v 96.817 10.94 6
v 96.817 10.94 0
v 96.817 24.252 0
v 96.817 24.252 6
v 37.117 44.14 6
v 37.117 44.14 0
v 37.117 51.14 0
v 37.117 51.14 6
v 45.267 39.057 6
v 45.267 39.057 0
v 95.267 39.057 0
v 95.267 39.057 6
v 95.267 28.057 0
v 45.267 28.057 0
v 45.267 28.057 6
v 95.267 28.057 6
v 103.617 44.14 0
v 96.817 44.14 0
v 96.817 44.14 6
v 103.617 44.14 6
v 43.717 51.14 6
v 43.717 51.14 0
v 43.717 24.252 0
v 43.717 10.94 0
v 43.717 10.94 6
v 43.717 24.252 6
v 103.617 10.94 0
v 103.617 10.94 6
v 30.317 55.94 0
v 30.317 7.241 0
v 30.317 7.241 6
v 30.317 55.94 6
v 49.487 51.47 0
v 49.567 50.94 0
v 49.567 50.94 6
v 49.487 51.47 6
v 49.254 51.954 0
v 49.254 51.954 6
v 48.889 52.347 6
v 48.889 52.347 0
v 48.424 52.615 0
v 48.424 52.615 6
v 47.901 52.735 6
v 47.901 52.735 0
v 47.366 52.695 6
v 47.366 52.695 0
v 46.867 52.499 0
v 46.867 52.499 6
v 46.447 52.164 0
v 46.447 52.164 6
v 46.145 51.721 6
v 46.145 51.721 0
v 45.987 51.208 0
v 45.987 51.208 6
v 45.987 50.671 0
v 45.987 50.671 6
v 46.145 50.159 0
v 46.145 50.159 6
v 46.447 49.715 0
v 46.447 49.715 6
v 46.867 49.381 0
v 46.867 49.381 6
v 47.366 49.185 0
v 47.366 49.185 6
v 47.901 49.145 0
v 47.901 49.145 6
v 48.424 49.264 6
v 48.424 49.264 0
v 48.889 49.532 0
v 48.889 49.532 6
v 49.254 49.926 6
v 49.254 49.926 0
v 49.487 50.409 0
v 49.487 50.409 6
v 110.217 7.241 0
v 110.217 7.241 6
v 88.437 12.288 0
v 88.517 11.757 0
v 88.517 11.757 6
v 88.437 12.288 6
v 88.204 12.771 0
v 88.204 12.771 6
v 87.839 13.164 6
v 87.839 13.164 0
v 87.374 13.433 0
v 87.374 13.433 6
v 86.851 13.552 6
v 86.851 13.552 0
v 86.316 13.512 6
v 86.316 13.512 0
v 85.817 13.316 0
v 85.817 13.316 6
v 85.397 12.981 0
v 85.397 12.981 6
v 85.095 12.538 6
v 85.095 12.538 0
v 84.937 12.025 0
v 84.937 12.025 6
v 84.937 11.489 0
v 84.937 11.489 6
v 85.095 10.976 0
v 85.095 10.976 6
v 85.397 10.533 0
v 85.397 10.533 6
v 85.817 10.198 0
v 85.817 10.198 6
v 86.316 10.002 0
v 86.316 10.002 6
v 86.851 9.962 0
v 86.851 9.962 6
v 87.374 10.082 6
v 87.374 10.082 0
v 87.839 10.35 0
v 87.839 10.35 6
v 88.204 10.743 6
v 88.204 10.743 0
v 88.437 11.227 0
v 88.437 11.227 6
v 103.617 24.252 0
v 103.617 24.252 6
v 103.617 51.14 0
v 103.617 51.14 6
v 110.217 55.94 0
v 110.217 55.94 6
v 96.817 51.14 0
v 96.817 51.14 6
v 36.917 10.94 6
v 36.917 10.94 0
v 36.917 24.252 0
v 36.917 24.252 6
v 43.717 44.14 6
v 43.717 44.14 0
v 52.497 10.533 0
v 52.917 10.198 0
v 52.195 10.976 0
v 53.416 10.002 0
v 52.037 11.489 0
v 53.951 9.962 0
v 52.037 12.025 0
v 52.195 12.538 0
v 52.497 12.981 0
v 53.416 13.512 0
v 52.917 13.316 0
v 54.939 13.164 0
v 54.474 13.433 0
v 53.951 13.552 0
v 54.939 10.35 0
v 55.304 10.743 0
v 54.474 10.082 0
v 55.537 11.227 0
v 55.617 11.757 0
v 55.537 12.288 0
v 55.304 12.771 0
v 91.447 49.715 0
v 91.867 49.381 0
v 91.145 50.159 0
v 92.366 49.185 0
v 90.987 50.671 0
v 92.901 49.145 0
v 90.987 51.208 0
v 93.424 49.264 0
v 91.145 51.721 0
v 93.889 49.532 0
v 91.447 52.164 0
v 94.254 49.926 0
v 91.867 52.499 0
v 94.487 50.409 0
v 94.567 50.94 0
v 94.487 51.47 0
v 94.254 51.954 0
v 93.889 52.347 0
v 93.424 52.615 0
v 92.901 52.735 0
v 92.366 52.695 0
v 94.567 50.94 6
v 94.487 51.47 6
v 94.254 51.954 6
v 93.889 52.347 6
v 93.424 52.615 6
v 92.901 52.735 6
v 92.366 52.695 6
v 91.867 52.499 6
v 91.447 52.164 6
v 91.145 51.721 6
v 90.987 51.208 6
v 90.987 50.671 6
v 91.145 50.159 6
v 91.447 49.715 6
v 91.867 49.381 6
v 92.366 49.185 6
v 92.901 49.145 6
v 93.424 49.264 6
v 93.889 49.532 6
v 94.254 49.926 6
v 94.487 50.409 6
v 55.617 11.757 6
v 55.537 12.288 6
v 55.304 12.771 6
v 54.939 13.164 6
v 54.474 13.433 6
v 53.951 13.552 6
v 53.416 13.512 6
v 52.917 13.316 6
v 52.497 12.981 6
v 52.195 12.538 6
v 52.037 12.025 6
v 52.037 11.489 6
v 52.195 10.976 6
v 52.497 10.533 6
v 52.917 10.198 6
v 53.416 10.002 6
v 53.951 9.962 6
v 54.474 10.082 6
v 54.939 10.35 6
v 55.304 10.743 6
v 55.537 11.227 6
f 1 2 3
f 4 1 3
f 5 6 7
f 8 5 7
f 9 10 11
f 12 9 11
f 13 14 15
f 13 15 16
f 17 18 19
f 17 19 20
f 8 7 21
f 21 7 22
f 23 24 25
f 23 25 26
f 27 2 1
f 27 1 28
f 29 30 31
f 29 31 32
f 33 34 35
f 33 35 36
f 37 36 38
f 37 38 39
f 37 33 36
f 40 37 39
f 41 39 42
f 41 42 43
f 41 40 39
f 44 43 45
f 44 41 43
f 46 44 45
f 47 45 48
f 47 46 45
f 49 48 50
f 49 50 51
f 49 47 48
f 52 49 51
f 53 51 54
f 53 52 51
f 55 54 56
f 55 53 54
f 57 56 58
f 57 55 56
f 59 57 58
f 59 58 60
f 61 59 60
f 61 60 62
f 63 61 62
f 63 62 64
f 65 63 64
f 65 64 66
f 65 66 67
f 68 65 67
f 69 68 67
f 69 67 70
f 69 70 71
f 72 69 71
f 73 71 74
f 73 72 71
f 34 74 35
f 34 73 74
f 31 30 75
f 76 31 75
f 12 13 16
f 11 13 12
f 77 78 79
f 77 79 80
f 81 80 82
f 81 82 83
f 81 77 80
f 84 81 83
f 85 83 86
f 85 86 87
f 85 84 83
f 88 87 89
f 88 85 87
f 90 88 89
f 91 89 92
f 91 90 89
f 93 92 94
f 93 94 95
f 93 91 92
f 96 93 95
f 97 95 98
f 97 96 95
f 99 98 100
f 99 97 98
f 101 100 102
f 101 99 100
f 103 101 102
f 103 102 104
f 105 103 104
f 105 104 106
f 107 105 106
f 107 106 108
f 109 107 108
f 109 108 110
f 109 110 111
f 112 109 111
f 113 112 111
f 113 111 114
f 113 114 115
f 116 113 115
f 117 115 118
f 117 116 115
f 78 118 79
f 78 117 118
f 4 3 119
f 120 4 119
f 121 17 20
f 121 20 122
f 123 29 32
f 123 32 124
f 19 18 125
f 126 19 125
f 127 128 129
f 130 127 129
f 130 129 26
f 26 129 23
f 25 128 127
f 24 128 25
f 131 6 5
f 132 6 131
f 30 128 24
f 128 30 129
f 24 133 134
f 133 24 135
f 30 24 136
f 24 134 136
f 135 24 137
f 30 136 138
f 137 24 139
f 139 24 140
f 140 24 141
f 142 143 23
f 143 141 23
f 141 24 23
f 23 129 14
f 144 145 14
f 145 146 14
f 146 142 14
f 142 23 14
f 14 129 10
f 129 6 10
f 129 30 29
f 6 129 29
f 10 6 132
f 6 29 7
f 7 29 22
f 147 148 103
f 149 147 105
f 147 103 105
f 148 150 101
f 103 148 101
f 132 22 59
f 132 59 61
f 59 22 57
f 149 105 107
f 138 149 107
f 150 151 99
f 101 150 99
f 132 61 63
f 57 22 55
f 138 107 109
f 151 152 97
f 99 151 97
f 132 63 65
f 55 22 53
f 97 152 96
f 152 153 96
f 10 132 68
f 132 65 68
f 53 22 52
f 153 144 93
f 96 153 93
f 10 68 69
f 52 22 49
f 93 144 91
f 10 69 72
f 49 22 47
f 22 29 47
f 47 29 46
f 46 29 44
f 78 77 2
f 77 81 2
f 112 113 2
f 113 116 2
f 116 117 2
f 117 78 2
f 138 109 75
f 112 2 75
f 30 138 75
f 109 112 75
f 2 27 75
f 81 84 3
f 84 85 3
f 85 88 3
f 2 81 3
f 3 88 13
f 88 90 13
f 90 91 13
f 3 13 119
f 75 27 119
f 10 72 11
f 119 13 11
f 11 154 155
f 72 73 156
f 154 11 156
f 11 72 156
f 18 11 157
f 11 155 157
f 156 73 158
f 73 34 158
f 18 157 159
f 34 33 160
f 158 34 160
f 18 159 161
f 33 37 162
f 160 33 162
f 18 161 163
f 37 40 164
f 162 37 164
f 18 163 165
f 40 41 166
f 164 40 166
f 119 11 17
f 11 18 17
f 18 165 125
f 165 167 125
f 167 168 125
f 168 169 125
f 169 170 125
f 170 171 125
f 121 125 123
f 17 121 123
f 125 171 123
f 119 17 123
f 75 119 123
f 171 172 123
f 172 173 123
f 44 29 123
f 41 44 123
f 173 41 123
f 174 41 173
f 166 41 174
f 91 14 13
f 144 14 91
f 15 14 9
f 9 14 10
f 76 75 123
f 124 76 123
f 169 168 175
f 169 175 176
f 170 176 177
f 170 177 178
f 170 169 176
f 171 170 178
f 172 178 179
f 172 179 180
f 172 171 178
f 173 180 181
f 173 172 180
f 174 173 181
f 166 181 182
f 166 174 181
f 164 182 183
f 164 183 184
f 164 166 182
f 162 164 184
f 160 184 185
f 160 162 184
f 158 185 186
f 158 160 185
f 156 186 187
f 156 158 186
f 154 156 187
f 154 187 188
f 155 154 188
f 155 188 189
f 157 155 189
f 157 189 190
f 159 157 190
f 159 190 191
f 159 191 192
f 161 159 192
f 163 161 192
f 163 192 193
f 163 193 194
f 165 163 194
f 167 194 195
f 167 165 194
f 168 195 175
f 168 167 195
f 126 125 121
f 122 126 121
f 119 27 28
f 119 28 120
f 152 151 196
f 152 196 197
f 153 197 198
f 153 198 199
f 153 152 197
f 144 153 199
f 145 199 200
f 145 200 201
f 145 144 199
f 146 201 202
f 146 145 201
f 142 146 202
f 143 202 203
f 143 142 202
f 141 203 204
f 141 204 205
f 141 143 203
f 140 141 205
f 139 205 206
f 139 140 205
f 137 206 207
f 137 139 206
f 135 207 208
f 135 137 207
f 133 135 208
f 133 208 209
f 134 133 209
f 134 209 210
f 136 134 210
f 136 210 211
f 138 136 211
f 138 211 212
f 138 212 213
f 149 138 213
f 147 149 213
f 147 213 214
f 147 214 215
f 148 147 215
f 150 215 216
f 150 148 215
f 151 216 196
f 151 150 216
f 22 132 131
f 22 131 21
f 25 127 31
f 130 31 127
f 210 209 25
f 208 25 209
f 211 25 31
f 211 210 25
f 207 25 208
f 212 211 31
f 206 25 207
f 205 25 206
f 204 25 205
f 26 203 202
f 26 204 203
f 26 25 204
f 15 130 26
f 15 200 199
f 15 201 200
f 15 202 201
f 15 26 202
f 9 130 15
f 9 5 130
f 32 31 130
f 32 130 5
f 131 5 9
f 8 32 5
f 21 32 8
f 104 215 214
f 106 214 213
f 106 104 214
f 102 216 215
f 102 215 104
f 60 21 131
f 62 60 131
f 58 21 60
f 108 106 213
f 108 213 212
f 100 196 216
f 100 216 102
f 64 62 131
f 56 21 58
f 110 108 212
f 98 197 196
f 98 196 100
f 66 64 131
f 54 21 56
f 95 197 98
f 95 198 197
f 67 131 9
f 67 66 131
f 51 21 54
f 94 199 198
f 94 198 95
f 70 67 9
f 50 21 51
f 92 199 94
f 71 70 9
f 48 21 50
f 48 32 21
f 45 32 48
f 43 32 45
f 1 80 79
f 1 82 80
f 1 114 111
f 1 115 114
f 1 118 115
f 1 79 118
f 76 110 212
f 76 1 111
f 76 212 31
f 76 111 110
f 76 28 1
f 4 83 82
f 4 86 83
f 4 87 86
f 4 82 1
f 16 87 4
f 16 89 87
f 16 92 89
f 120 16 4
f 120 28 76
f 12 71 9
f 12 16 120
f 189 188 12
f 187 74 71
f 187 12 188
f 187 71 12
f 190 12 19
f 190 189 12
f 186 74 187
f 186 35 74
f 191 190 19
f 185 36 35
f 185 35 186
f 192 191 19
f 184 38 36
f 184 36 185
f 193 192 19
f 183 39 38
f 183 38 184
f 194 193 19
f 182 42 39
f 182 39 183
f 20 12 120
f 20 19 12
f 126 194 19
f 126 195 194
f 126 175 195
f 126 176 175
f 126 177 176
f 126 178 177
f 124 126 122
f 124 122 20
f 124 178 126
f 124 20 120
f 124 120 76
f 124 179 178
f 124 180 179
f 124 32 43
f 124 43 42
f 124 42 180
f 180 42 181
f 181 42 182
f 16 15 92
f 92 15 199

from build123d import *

# Parameters (mm, degrees)
MODEL_W                  = 79.9
MODEL_H                  = 48.698269882
MODEL_R                  = 1.8
MODEL_W_2                = 6.8
MODEL_H_2                = 13.312275424
MODEL_W_3                = 6.6
MODEL_H_3                = 7
MODEL_W_4                = 49.999979697
MODEL_H_4                = 10.999995003
RESSALTO_EXTRUS_O1_DEPTH = 6


with BuildPart() as part:
    # Model → Ressalto-extrusão1 (new body)
    with BuildSketch(Plane.XY):
        with Locations((70.266607808, 31.590543985)):
            Rectangle(MODEL_W, MODEL_H)
        with Locations((53.816607808, 11.757142514)):
            Circle(MODEL_R, mode=Mode.SUBTRACT)
        with Locations((92.766607808, 50.939678926)):
            Circle(MODEL_R, mode=Mode.SUBTRACT)
        with Locations((86.716607808, 11.757142514)):
            Circle(MODEL_R, mode=Mode.SUBTRACT)
        with Locations((47.766607808, 50.939678926)):
            Circle(MODEL_R, mode=Mode.SUBTRACT)
        with Locations((40.316607808, 17.595816638)):
            Rectangle(MODEL_W_2, MODEL_H_2, mode=Mode.SUBTRACT)
        with Locations((40.416607808, 47.639678926)):
            Rectangle(MODEL_W_3, MODEL_H_3, mode=Mode.SUBTRACT)
        with Locations((100.216607808, 17.595816638)):
            Rectangle(MODEL_W_2, MODEL_H_2, mode=Mode.SUBTRACT)
        with Locations((100.216607808, 47.639678926)):
            Rectangle(MODEL_W_2, MODEL_H_3, mode=Mode.SUBTRACT)
        with Locations((70.266607808, 33.557142515)):
            Rectangle(MODEL_W_4, MODEL_H_4, mode=Mode.SUBTRACT)
    extrude(amount=RESSALTO_EXTRUS_O1_DEPTH)


solid = part.part
